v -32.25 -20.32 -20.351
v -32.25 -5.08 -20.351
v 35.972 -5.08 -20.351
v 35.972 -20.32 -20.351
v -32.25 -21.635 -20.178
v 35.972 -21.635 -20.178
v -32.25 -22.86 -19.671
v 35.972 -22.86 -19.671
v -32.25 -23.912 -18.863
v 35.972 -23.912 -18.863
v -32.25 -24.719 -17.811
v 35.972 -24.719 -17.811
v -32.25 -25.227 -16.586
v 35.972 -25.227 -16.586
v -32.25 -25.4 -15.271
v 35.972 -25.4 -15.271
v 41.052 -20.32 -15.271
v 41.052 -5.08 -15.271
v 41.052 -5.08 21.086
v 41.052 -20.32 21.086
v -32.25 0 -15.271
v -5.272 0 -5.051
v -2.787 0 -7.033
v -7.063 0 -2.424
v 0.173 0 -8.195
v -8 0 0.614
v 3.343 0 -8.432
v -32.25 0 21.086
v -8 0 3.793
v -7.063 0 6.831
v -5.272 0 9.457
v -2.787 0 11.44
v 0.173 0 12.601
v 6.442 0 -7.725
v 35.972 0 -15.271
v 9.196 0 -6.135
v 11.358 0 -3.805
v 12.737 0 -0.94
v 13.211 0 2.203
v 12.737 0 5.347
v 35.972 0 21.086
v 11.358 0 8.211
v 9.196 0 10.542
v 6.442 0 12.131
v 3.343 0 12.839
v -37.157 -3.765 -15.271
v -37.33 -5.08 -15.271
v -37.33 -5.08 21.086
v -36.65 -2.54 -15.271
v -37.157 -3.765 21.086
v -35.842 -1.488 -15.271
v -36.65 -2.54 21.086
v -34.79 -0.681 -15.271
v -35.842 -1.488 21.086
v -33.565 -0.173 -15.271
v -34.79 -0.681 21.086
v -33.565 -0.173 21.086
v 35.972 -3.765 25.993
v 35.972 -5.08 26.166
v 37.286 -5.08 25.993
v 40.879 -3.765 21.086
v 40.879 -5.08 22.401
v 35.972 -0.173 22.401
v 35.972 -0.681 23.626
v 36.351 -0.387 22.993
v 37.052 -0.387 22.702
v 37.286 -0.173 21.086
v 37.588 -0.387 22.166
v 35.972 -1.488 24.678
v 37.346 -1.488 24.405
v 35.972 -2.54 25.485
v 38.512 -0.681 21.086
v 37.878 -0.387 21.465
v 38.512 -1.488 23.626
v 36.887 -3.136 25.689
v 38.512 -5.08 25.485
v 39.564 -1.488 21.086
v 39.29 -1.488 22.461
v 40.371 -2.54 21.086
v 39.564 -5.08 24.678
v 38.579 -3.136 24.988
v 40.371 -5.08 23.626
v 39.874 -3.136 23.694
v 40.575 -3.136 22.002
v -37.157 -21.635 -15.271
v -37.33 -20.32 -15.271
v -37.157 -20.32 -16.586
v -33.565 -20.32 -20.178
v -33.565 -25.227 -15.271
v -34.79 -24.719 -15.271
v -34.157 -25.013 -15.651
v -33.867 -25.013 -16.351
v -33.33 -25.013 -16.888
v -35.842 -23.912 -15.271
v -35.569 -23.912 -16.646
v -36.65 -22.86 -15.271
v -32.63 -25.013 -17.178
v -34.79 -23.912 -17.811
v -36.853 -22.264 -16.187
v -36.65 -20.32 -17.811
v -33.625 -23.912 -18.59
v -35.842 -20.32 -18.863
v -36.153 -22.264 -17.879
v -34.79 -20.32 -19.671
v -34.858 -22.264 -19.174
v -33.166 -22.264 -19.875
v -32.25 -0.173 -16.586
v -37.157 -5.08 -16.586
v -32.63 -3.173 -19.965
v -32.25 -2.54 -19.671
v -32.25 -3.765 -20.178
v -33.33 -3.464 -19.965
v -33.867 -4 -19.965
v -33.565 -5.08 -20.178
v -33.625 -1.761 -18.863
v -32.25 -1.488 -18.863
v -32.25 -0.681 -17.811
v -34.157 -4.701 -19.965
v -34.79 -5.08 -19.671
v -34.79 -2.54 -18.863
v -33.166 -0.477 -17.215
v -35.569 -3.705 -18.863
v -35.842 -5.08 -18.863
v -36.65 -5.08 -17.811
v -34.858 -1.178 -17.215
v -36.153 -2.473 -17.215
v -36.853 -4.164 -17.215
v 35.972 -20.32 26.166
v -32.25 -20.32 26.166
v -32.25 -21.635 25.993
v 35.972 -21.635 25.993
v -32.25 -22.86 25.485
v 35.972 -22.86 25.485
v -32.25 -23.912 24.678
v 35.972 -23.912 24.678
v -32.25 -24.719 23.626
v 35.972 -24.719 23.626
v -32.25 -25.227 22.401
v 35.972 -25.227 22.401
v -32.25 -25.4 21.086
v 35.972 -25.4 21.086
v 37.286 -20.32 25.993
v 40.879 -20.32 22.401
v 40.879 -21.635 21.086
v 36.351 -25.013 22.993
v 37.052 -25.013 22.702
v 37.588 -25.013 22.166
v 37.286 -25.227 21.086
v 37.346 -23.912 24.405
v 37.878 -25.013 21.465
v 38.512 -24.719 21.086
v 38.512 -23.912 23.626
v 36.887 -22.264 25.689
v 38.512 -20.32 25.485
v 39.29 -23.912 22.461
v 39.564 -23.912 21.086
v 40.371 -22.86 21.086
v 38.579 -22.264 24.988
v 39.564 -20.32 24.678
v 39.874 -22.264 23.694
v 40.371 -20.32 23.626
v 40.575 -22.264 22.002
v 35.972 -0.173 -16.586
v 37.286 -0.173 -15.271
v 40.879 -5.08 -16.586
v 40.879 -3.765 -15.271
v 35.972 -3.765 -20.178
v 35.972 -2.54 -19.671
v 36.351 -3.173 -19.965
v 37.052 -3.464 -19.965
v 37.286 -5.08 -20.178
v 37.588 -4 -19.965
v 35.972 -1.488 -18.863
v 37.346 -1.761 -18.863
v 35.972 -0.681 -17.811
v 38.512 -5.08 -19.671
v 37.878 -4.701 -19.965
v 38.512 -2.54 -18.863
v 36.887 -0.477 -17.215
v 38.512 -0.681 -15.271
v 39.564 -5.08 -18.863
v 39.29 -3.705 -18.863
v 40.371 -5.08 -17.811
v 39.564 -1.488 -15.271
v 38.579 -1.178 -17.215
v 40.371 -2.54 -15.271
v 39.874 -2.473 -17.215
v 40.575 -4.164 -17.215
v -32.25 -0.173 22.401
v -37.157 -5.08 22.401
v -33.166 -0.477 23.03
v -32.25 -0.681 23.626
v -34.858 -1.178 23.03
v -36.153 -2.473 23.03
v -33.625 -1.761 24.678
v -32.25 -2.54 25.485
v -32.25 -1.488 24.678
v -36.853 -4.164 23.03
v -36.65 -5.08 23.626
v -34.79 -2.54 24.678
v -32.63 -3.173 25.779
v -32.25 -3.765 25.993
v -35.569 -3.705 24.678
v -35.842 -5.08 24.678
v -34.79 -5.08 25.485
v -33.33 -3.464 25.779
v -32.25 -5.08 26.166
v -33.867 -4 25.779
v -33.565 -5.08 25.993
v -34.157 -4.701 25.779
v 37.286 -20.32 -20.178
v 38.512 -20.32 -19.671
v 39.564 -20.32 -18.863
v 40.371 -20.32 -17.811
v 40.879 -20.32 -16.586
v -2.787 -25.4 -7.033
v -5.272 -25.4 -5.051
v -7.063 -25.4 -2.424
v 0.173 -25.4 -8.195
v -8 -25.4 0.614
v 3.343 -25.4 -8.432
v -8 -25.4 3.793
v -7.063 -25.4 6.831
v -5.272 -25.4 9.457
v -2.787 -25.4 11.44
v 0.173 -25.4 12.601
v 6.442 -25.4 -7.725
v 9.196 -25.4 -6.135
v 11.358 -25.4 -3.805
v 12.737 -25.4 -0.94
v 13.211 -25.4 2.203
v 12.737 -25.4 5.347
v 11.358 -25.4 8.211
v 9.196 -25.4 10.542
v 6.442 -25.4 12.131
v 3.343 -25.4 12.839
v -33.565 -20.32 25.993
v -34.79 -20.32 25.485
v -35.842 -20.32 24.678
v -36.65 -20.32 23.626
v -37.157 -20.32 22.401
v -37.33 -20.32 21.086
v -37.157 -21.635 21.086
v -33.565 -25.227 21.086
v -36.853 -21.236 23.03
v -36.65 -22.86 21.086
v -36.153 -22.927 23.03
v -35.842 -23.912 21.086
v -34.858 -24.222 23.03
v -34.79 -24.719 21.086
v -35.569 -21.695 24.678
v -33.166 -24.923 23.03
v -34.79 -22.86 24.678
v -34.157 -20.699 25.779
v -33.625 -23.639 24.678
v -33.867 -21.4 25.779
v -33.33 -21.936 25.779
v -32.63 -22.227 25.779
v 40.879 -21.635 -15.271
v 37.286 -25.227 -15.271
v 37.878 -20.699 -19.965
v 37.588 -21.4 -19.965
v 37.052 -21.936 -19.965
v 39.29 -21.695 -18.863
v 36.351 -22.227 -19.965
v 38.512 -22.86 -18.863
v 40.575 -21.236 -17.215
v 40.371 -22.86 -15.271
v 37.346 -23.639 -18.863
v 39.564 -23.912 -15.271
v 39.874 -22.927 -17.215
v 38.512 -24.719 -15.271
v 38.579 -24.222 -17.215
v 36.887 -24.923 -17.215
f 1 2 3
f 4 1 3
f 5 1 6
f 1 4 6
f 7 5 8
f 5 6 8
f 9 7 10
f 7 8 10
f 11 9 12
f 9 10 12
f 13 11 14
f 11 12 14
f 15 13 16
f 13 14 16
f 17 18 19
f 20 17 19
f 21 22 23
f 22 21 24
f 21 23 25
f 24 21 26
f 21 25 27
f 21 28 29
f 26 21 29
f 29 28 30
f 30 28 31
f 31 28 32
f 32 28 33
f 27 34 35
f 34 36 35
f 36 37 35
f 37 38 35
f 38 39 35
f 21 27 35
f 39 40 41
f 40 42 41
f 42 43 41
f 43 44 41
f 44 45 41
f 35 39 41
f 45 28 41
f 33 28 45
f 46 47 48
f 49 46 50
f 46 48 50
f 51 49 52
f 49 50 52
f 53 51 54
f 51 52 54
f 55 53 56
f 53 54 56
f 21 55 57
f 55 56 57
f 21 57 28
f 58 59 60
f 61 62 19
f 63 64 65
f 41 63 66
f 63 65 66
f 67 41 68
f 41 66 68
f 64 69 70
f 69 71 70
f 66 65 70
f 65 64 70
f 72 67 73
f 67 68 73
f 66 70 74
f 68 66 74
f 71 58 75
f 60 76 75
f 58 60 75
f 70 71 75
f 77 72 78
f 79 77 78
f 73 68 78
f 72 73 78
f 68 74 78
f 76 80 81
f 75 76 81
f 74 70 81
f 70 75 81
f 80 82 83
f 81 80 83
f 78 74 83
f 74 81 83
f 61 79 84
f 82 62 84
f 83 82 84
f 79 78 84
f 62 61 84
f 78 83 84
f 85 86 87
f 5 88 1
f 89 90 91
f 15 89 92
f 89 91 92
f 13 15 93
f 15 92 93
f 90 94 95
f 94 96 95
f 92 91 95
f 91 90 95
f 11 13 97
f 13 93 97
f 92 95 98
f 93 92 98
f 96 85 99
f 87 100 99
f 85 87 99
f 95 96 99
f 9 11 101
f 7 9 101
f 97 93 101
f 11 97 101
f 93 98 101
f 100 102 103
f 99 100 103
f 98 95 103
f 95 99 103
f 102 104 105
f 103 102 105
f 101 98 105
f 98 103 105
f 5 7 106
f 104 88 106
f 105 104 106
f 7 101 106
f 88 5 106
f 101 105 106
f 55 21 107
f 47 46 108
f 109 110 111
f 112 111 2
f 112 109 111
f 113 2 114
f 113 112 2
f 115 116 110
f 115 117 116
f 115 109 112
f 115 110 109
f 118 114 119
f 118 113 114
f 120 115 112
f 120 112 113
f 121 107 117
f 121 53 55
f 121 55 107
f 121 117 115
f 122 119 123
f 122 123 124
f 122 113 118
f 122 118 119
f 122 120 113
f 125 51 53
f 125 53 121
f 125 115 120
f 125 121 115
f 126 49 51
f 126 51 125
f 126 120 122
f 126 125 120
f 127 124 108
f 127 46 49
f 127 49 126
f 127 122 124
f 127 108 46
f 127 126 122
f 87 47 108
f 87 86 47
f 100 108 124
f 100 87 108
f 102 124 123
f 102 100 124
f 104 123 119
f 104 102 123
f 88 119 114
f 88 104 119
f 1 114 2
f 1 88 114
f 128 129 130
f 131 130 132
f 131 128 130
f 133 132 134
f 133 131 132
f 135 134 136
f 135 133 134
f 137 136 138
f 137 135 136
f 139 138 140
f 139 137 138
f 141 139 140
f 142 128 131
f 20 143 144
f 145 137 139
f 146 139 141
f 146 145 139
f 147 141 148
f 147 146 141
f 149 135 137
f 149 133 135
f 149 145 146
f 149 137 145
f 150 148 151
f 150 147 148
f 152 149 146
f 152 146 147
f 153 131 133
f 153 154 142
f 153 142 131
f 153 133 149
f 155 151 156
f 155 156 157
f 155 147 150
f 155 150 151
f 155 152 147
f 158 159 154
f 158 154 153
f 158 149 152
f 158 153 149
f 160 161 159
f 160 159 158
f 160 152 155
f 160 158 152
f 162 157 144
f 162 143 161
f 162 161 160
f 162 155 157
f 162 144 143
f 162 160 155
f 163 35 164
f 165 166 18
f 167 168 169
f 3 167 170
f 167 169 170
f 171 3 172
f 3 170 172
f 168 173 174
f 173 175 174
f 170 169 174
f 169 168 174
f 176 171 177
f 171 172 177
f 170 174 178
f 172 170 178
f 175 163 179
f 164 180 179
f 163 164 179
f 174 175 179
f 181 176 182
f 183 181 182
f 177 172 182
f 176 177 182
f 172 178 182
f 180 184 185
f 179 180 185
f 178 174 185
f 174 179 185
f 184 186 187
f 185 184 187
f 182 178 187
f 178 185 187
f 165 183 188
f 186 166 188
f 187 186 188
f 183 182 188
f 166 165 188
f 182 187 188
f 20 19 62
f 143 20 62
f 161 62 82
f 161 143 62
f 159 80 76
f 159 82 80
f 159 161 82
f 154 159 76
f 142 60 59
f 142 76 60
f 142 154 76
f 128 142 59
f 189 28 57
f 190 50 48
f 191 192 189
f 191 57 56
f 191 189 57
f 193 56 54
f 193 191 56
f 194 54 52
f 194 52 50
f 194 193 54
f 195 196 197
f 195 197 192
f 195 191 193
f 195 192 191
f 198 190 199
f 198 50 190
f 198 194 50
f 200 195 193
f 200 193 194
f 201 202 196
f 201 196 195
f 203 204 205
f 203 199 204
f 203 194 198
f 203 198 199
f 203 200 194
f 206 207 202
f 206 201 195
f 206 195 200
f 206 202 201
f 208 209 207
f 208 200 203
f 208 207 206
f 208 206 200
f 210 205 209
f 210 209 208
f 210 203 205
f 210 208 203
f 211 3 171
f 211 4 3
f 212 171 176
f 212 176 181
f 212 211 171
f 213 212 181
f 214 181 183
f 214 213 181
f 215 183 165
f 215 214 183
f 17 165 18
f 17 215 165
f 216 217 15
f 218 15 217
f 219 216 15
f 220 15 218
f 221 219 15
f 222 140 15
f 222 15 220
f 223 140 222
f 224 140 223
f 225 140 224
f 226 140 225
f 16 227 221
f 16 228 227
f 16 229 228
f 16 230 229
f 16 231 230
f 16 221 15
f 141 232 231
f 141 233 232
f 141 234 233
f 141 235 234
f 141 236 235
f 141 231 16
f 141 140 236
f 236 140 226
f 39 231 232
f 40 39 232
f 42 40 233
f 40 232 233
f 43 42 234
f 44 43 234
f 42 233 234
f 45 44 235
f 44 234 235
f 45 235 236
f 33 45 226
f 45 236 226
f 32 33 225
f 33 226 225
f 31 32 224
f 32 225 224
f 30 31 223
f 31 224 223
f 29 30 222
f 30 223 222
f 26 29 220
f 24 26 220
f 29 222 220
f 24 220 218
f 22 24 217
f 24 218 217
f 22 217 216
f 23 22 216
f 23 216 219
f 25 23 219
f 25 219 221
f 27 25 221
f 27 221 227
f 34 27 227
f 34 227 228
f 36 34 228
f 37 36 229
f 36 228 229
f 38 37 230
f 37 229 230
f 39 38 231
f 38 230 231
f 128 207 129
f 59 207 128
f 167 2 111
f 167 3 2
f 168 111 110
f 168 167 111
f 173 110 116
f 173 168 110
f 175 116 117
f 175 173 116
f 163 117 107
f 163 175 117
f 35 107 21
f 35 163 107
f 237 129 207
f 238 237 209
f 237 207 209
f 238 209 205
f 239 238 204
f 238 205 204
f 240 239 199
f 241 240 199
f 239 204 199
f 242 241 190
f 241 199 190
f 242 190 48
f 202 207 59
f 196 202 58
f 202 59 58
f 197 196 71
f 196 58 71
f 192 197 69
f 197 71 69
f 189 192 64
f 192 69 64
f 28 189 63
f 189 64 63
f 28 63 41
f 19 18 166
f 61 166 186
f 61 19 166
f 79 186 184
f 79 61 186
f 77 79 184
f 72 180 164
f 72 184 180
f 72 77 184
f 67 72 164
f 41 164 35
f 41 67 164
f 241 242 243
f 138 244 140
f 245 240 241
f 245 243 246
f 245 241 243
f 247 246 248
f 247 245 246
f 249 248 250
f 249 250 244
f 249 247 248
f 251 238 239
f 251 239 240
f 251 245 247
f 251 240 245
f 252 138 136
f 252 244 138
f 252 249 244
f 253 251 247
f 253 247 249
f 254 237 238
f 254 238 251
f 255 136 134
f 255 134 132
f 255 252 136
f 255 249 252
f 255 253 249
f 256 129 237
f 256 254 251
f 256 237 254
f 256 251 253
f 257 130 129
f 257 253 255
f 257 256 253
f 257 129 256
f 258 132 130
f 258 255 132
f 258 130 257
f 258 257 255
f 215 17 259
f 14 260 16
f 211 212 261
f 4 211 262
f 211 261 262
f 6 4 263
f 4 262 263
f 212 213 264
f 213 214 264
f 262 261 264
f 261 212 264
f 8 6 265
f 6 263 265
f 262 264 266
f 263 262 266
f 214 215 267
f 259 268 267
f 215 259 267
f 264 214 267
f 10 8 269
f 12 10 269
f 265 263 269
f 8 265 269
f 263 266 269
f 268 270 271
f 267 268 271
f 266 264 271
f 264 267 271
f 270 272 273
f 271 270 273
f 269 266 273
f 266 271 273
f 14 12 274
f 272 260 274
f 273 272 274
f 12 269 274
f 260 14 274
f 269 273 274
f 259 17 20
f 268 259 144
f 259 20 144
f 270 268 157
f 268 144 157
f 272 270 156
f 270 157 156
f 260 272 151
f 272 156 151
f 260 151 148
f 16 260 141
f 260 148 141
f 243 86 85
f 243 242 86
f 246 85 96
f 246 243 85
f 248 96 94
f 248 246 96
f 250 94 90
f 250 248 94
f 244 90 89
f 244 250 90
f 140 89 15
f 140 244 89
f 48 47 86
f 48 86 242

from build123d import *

# Parameters (mm, degrees)
F0_W         = 78.3818922937
F0_H         = 46.5174447745
F1_DEPTH     = 25.4
F2_R         = 5.08
F3_T1_DEPTH  = 15.24
F3_S5_W      = 5.08
F3_S5_H      = 5.08
F3_T6_DEPTH  = 5.08
F3_S11_W     = 5.08
F3_S11_H     = 5.08
F3_T12_DEPTH = 5.08
F4_R         = 10.6653295048
F5_DEPTH     = 25.4


# Not quite as in the source:
# - a fillet or chamfer that OpenCascade refuses, or shapes differently, is made with other operations: its cross-section is extruded or revolved along the edge and cut away or added


with BuildPart() as f1:
    # F0 (on Front) → F1 (new body)
    with BuildSketch(Plane.XZ):
        with Locations((1.8606986851, 2.9073404148)):
            Rectangle(F0_W, F0_H)
    extrude(amount=F1_DEPTH)

    # F2
    f2_edges = [f1.edges().sort_by_distance(p)[0] for p in [
        (41.051645, -12.7, 26.166063),
        (1.860699, -25.4, 26.166063),
        (1.860699, 0, 26.166063),
        (41.051645, -25.4, 2.90734),
        (41.051645, 0, 2.90734),
        (-37.330247, 0, 2.90734),
        (1.860699, 0, -20.351382),
        (41.051645, -12.7, -20.351382),
        (-37.330247, -12.7, -20.351382),
        (-37.330247, -25.4, 2.90734),
        (1.860699, -25.4, -20.351382),
    ]]
    fillet(f2_edges, radius=F2_R)

    # F3: fillet of radius 5.08 on 1 edges, made by hand

    # F3_s2 → F3_t1 (cut)
    with BuildSketch(Plane.XZ.offset(5.08)):
        with BuildLine():
            ThreePointArc((-32.2502474618, 26.1660628021), (-35.8423499102, 24.6781652505), (-37.3302474618, 21.0860628021))
            Line((-37.3302474618, 21.0860628021), (-37.3302474618, 26.1660628021))
            Line((-37.3302474618, 26.1660628021), (-32.2502474618, 26.1660628021))
        make_face()
    extrude(amount=F3_T1_DEPTH, mode=Mode.SUBTRACT)


with BuildPart() as f3_tool4:
    # F3_s5 → F3_t6 (new body)
    with BuildSketch(Plane.XY.offset(21.0860628021)):
        with Locations((-34.7902474618, -2.54)):
            Rectangle(F3_S5_W, F3_S5_H)
    extrude(amount=F3_T6_DEPTH)

    # F3_s7 → F3_t8 (revolve, cut)
    with BuildSketch(Plane(origin=(-32.2502474618, -5.08, 21.0860628021), x_dir=(0.7071067812, -0.7071067812, 0), z_dir=(-0.7071067812, -0.7071067812, 0))):
        with BuildLine():
            ThreePointArc((0, -5.08), (5.08, 0), (0, 5.08))
            Line((0, 5.08), (0, -5.08))
        make_face()
    revolve(axis=Axis((-32.2502474618, -5.08, 21.0860628021), (0, 0, 1)), mode=Mode.SUBTRACT)


with BuildPart() as f1_1:
    add(f1.part)

    # F3_t3: cut F3_tool4
    add(f3_tool4.part, mode=Mode.SUBTRACT)


with BuildPart() as f3_tool10:
    # F3_s11 → F3_t12 (new body)
    with BuildSketch(Plane.XY.offset(21.0860628021)):
        with Locations((-34.7902474618, -22.86)):
            Rectangle(F3_S11_W, F3_S11_H)
    extrude(amount=F3_T12_DEPTH)

    # F3_s13 → F3_t14 (revolve, cut)
    with BuildSketch(Plane(origin=(-32.2502474618, -20.32, 21.0860628021), x_dir=(0.7071067812, 0.7071067812, 0), z_dir=(0.7071067812, -0.7071067812, 0))):
        with BuildLine():
            ThreePointArc((0, -5.08), (5.08, 0), (0, 5.08))
            Line((0, 5.08), (0, -5.08))
        make_face()
    revolve(axis=Axis((-32.2502474618, -20.32, 21.0860628021), (0, 0, 1)), mode=Mode.SUBTRACT)


with BuildPart() as f1_2:
    add(f1_1.part)

    # F3_t9: cut F3_tool10
    add(f3_tool10.part, mode=Mode.SUBTRACT)

    # F4 (on face) → F5 (cut, through all)
    with BuildSketch(Plane.XZ.offset(25.4)):
        with Locations((2.5458505843, 2.2031988483)):
            Circle(F4_R)
    extrude(amount=-F5_DEPTH, mode=Mode.SUBTRACT)


solid = f1_2.part
